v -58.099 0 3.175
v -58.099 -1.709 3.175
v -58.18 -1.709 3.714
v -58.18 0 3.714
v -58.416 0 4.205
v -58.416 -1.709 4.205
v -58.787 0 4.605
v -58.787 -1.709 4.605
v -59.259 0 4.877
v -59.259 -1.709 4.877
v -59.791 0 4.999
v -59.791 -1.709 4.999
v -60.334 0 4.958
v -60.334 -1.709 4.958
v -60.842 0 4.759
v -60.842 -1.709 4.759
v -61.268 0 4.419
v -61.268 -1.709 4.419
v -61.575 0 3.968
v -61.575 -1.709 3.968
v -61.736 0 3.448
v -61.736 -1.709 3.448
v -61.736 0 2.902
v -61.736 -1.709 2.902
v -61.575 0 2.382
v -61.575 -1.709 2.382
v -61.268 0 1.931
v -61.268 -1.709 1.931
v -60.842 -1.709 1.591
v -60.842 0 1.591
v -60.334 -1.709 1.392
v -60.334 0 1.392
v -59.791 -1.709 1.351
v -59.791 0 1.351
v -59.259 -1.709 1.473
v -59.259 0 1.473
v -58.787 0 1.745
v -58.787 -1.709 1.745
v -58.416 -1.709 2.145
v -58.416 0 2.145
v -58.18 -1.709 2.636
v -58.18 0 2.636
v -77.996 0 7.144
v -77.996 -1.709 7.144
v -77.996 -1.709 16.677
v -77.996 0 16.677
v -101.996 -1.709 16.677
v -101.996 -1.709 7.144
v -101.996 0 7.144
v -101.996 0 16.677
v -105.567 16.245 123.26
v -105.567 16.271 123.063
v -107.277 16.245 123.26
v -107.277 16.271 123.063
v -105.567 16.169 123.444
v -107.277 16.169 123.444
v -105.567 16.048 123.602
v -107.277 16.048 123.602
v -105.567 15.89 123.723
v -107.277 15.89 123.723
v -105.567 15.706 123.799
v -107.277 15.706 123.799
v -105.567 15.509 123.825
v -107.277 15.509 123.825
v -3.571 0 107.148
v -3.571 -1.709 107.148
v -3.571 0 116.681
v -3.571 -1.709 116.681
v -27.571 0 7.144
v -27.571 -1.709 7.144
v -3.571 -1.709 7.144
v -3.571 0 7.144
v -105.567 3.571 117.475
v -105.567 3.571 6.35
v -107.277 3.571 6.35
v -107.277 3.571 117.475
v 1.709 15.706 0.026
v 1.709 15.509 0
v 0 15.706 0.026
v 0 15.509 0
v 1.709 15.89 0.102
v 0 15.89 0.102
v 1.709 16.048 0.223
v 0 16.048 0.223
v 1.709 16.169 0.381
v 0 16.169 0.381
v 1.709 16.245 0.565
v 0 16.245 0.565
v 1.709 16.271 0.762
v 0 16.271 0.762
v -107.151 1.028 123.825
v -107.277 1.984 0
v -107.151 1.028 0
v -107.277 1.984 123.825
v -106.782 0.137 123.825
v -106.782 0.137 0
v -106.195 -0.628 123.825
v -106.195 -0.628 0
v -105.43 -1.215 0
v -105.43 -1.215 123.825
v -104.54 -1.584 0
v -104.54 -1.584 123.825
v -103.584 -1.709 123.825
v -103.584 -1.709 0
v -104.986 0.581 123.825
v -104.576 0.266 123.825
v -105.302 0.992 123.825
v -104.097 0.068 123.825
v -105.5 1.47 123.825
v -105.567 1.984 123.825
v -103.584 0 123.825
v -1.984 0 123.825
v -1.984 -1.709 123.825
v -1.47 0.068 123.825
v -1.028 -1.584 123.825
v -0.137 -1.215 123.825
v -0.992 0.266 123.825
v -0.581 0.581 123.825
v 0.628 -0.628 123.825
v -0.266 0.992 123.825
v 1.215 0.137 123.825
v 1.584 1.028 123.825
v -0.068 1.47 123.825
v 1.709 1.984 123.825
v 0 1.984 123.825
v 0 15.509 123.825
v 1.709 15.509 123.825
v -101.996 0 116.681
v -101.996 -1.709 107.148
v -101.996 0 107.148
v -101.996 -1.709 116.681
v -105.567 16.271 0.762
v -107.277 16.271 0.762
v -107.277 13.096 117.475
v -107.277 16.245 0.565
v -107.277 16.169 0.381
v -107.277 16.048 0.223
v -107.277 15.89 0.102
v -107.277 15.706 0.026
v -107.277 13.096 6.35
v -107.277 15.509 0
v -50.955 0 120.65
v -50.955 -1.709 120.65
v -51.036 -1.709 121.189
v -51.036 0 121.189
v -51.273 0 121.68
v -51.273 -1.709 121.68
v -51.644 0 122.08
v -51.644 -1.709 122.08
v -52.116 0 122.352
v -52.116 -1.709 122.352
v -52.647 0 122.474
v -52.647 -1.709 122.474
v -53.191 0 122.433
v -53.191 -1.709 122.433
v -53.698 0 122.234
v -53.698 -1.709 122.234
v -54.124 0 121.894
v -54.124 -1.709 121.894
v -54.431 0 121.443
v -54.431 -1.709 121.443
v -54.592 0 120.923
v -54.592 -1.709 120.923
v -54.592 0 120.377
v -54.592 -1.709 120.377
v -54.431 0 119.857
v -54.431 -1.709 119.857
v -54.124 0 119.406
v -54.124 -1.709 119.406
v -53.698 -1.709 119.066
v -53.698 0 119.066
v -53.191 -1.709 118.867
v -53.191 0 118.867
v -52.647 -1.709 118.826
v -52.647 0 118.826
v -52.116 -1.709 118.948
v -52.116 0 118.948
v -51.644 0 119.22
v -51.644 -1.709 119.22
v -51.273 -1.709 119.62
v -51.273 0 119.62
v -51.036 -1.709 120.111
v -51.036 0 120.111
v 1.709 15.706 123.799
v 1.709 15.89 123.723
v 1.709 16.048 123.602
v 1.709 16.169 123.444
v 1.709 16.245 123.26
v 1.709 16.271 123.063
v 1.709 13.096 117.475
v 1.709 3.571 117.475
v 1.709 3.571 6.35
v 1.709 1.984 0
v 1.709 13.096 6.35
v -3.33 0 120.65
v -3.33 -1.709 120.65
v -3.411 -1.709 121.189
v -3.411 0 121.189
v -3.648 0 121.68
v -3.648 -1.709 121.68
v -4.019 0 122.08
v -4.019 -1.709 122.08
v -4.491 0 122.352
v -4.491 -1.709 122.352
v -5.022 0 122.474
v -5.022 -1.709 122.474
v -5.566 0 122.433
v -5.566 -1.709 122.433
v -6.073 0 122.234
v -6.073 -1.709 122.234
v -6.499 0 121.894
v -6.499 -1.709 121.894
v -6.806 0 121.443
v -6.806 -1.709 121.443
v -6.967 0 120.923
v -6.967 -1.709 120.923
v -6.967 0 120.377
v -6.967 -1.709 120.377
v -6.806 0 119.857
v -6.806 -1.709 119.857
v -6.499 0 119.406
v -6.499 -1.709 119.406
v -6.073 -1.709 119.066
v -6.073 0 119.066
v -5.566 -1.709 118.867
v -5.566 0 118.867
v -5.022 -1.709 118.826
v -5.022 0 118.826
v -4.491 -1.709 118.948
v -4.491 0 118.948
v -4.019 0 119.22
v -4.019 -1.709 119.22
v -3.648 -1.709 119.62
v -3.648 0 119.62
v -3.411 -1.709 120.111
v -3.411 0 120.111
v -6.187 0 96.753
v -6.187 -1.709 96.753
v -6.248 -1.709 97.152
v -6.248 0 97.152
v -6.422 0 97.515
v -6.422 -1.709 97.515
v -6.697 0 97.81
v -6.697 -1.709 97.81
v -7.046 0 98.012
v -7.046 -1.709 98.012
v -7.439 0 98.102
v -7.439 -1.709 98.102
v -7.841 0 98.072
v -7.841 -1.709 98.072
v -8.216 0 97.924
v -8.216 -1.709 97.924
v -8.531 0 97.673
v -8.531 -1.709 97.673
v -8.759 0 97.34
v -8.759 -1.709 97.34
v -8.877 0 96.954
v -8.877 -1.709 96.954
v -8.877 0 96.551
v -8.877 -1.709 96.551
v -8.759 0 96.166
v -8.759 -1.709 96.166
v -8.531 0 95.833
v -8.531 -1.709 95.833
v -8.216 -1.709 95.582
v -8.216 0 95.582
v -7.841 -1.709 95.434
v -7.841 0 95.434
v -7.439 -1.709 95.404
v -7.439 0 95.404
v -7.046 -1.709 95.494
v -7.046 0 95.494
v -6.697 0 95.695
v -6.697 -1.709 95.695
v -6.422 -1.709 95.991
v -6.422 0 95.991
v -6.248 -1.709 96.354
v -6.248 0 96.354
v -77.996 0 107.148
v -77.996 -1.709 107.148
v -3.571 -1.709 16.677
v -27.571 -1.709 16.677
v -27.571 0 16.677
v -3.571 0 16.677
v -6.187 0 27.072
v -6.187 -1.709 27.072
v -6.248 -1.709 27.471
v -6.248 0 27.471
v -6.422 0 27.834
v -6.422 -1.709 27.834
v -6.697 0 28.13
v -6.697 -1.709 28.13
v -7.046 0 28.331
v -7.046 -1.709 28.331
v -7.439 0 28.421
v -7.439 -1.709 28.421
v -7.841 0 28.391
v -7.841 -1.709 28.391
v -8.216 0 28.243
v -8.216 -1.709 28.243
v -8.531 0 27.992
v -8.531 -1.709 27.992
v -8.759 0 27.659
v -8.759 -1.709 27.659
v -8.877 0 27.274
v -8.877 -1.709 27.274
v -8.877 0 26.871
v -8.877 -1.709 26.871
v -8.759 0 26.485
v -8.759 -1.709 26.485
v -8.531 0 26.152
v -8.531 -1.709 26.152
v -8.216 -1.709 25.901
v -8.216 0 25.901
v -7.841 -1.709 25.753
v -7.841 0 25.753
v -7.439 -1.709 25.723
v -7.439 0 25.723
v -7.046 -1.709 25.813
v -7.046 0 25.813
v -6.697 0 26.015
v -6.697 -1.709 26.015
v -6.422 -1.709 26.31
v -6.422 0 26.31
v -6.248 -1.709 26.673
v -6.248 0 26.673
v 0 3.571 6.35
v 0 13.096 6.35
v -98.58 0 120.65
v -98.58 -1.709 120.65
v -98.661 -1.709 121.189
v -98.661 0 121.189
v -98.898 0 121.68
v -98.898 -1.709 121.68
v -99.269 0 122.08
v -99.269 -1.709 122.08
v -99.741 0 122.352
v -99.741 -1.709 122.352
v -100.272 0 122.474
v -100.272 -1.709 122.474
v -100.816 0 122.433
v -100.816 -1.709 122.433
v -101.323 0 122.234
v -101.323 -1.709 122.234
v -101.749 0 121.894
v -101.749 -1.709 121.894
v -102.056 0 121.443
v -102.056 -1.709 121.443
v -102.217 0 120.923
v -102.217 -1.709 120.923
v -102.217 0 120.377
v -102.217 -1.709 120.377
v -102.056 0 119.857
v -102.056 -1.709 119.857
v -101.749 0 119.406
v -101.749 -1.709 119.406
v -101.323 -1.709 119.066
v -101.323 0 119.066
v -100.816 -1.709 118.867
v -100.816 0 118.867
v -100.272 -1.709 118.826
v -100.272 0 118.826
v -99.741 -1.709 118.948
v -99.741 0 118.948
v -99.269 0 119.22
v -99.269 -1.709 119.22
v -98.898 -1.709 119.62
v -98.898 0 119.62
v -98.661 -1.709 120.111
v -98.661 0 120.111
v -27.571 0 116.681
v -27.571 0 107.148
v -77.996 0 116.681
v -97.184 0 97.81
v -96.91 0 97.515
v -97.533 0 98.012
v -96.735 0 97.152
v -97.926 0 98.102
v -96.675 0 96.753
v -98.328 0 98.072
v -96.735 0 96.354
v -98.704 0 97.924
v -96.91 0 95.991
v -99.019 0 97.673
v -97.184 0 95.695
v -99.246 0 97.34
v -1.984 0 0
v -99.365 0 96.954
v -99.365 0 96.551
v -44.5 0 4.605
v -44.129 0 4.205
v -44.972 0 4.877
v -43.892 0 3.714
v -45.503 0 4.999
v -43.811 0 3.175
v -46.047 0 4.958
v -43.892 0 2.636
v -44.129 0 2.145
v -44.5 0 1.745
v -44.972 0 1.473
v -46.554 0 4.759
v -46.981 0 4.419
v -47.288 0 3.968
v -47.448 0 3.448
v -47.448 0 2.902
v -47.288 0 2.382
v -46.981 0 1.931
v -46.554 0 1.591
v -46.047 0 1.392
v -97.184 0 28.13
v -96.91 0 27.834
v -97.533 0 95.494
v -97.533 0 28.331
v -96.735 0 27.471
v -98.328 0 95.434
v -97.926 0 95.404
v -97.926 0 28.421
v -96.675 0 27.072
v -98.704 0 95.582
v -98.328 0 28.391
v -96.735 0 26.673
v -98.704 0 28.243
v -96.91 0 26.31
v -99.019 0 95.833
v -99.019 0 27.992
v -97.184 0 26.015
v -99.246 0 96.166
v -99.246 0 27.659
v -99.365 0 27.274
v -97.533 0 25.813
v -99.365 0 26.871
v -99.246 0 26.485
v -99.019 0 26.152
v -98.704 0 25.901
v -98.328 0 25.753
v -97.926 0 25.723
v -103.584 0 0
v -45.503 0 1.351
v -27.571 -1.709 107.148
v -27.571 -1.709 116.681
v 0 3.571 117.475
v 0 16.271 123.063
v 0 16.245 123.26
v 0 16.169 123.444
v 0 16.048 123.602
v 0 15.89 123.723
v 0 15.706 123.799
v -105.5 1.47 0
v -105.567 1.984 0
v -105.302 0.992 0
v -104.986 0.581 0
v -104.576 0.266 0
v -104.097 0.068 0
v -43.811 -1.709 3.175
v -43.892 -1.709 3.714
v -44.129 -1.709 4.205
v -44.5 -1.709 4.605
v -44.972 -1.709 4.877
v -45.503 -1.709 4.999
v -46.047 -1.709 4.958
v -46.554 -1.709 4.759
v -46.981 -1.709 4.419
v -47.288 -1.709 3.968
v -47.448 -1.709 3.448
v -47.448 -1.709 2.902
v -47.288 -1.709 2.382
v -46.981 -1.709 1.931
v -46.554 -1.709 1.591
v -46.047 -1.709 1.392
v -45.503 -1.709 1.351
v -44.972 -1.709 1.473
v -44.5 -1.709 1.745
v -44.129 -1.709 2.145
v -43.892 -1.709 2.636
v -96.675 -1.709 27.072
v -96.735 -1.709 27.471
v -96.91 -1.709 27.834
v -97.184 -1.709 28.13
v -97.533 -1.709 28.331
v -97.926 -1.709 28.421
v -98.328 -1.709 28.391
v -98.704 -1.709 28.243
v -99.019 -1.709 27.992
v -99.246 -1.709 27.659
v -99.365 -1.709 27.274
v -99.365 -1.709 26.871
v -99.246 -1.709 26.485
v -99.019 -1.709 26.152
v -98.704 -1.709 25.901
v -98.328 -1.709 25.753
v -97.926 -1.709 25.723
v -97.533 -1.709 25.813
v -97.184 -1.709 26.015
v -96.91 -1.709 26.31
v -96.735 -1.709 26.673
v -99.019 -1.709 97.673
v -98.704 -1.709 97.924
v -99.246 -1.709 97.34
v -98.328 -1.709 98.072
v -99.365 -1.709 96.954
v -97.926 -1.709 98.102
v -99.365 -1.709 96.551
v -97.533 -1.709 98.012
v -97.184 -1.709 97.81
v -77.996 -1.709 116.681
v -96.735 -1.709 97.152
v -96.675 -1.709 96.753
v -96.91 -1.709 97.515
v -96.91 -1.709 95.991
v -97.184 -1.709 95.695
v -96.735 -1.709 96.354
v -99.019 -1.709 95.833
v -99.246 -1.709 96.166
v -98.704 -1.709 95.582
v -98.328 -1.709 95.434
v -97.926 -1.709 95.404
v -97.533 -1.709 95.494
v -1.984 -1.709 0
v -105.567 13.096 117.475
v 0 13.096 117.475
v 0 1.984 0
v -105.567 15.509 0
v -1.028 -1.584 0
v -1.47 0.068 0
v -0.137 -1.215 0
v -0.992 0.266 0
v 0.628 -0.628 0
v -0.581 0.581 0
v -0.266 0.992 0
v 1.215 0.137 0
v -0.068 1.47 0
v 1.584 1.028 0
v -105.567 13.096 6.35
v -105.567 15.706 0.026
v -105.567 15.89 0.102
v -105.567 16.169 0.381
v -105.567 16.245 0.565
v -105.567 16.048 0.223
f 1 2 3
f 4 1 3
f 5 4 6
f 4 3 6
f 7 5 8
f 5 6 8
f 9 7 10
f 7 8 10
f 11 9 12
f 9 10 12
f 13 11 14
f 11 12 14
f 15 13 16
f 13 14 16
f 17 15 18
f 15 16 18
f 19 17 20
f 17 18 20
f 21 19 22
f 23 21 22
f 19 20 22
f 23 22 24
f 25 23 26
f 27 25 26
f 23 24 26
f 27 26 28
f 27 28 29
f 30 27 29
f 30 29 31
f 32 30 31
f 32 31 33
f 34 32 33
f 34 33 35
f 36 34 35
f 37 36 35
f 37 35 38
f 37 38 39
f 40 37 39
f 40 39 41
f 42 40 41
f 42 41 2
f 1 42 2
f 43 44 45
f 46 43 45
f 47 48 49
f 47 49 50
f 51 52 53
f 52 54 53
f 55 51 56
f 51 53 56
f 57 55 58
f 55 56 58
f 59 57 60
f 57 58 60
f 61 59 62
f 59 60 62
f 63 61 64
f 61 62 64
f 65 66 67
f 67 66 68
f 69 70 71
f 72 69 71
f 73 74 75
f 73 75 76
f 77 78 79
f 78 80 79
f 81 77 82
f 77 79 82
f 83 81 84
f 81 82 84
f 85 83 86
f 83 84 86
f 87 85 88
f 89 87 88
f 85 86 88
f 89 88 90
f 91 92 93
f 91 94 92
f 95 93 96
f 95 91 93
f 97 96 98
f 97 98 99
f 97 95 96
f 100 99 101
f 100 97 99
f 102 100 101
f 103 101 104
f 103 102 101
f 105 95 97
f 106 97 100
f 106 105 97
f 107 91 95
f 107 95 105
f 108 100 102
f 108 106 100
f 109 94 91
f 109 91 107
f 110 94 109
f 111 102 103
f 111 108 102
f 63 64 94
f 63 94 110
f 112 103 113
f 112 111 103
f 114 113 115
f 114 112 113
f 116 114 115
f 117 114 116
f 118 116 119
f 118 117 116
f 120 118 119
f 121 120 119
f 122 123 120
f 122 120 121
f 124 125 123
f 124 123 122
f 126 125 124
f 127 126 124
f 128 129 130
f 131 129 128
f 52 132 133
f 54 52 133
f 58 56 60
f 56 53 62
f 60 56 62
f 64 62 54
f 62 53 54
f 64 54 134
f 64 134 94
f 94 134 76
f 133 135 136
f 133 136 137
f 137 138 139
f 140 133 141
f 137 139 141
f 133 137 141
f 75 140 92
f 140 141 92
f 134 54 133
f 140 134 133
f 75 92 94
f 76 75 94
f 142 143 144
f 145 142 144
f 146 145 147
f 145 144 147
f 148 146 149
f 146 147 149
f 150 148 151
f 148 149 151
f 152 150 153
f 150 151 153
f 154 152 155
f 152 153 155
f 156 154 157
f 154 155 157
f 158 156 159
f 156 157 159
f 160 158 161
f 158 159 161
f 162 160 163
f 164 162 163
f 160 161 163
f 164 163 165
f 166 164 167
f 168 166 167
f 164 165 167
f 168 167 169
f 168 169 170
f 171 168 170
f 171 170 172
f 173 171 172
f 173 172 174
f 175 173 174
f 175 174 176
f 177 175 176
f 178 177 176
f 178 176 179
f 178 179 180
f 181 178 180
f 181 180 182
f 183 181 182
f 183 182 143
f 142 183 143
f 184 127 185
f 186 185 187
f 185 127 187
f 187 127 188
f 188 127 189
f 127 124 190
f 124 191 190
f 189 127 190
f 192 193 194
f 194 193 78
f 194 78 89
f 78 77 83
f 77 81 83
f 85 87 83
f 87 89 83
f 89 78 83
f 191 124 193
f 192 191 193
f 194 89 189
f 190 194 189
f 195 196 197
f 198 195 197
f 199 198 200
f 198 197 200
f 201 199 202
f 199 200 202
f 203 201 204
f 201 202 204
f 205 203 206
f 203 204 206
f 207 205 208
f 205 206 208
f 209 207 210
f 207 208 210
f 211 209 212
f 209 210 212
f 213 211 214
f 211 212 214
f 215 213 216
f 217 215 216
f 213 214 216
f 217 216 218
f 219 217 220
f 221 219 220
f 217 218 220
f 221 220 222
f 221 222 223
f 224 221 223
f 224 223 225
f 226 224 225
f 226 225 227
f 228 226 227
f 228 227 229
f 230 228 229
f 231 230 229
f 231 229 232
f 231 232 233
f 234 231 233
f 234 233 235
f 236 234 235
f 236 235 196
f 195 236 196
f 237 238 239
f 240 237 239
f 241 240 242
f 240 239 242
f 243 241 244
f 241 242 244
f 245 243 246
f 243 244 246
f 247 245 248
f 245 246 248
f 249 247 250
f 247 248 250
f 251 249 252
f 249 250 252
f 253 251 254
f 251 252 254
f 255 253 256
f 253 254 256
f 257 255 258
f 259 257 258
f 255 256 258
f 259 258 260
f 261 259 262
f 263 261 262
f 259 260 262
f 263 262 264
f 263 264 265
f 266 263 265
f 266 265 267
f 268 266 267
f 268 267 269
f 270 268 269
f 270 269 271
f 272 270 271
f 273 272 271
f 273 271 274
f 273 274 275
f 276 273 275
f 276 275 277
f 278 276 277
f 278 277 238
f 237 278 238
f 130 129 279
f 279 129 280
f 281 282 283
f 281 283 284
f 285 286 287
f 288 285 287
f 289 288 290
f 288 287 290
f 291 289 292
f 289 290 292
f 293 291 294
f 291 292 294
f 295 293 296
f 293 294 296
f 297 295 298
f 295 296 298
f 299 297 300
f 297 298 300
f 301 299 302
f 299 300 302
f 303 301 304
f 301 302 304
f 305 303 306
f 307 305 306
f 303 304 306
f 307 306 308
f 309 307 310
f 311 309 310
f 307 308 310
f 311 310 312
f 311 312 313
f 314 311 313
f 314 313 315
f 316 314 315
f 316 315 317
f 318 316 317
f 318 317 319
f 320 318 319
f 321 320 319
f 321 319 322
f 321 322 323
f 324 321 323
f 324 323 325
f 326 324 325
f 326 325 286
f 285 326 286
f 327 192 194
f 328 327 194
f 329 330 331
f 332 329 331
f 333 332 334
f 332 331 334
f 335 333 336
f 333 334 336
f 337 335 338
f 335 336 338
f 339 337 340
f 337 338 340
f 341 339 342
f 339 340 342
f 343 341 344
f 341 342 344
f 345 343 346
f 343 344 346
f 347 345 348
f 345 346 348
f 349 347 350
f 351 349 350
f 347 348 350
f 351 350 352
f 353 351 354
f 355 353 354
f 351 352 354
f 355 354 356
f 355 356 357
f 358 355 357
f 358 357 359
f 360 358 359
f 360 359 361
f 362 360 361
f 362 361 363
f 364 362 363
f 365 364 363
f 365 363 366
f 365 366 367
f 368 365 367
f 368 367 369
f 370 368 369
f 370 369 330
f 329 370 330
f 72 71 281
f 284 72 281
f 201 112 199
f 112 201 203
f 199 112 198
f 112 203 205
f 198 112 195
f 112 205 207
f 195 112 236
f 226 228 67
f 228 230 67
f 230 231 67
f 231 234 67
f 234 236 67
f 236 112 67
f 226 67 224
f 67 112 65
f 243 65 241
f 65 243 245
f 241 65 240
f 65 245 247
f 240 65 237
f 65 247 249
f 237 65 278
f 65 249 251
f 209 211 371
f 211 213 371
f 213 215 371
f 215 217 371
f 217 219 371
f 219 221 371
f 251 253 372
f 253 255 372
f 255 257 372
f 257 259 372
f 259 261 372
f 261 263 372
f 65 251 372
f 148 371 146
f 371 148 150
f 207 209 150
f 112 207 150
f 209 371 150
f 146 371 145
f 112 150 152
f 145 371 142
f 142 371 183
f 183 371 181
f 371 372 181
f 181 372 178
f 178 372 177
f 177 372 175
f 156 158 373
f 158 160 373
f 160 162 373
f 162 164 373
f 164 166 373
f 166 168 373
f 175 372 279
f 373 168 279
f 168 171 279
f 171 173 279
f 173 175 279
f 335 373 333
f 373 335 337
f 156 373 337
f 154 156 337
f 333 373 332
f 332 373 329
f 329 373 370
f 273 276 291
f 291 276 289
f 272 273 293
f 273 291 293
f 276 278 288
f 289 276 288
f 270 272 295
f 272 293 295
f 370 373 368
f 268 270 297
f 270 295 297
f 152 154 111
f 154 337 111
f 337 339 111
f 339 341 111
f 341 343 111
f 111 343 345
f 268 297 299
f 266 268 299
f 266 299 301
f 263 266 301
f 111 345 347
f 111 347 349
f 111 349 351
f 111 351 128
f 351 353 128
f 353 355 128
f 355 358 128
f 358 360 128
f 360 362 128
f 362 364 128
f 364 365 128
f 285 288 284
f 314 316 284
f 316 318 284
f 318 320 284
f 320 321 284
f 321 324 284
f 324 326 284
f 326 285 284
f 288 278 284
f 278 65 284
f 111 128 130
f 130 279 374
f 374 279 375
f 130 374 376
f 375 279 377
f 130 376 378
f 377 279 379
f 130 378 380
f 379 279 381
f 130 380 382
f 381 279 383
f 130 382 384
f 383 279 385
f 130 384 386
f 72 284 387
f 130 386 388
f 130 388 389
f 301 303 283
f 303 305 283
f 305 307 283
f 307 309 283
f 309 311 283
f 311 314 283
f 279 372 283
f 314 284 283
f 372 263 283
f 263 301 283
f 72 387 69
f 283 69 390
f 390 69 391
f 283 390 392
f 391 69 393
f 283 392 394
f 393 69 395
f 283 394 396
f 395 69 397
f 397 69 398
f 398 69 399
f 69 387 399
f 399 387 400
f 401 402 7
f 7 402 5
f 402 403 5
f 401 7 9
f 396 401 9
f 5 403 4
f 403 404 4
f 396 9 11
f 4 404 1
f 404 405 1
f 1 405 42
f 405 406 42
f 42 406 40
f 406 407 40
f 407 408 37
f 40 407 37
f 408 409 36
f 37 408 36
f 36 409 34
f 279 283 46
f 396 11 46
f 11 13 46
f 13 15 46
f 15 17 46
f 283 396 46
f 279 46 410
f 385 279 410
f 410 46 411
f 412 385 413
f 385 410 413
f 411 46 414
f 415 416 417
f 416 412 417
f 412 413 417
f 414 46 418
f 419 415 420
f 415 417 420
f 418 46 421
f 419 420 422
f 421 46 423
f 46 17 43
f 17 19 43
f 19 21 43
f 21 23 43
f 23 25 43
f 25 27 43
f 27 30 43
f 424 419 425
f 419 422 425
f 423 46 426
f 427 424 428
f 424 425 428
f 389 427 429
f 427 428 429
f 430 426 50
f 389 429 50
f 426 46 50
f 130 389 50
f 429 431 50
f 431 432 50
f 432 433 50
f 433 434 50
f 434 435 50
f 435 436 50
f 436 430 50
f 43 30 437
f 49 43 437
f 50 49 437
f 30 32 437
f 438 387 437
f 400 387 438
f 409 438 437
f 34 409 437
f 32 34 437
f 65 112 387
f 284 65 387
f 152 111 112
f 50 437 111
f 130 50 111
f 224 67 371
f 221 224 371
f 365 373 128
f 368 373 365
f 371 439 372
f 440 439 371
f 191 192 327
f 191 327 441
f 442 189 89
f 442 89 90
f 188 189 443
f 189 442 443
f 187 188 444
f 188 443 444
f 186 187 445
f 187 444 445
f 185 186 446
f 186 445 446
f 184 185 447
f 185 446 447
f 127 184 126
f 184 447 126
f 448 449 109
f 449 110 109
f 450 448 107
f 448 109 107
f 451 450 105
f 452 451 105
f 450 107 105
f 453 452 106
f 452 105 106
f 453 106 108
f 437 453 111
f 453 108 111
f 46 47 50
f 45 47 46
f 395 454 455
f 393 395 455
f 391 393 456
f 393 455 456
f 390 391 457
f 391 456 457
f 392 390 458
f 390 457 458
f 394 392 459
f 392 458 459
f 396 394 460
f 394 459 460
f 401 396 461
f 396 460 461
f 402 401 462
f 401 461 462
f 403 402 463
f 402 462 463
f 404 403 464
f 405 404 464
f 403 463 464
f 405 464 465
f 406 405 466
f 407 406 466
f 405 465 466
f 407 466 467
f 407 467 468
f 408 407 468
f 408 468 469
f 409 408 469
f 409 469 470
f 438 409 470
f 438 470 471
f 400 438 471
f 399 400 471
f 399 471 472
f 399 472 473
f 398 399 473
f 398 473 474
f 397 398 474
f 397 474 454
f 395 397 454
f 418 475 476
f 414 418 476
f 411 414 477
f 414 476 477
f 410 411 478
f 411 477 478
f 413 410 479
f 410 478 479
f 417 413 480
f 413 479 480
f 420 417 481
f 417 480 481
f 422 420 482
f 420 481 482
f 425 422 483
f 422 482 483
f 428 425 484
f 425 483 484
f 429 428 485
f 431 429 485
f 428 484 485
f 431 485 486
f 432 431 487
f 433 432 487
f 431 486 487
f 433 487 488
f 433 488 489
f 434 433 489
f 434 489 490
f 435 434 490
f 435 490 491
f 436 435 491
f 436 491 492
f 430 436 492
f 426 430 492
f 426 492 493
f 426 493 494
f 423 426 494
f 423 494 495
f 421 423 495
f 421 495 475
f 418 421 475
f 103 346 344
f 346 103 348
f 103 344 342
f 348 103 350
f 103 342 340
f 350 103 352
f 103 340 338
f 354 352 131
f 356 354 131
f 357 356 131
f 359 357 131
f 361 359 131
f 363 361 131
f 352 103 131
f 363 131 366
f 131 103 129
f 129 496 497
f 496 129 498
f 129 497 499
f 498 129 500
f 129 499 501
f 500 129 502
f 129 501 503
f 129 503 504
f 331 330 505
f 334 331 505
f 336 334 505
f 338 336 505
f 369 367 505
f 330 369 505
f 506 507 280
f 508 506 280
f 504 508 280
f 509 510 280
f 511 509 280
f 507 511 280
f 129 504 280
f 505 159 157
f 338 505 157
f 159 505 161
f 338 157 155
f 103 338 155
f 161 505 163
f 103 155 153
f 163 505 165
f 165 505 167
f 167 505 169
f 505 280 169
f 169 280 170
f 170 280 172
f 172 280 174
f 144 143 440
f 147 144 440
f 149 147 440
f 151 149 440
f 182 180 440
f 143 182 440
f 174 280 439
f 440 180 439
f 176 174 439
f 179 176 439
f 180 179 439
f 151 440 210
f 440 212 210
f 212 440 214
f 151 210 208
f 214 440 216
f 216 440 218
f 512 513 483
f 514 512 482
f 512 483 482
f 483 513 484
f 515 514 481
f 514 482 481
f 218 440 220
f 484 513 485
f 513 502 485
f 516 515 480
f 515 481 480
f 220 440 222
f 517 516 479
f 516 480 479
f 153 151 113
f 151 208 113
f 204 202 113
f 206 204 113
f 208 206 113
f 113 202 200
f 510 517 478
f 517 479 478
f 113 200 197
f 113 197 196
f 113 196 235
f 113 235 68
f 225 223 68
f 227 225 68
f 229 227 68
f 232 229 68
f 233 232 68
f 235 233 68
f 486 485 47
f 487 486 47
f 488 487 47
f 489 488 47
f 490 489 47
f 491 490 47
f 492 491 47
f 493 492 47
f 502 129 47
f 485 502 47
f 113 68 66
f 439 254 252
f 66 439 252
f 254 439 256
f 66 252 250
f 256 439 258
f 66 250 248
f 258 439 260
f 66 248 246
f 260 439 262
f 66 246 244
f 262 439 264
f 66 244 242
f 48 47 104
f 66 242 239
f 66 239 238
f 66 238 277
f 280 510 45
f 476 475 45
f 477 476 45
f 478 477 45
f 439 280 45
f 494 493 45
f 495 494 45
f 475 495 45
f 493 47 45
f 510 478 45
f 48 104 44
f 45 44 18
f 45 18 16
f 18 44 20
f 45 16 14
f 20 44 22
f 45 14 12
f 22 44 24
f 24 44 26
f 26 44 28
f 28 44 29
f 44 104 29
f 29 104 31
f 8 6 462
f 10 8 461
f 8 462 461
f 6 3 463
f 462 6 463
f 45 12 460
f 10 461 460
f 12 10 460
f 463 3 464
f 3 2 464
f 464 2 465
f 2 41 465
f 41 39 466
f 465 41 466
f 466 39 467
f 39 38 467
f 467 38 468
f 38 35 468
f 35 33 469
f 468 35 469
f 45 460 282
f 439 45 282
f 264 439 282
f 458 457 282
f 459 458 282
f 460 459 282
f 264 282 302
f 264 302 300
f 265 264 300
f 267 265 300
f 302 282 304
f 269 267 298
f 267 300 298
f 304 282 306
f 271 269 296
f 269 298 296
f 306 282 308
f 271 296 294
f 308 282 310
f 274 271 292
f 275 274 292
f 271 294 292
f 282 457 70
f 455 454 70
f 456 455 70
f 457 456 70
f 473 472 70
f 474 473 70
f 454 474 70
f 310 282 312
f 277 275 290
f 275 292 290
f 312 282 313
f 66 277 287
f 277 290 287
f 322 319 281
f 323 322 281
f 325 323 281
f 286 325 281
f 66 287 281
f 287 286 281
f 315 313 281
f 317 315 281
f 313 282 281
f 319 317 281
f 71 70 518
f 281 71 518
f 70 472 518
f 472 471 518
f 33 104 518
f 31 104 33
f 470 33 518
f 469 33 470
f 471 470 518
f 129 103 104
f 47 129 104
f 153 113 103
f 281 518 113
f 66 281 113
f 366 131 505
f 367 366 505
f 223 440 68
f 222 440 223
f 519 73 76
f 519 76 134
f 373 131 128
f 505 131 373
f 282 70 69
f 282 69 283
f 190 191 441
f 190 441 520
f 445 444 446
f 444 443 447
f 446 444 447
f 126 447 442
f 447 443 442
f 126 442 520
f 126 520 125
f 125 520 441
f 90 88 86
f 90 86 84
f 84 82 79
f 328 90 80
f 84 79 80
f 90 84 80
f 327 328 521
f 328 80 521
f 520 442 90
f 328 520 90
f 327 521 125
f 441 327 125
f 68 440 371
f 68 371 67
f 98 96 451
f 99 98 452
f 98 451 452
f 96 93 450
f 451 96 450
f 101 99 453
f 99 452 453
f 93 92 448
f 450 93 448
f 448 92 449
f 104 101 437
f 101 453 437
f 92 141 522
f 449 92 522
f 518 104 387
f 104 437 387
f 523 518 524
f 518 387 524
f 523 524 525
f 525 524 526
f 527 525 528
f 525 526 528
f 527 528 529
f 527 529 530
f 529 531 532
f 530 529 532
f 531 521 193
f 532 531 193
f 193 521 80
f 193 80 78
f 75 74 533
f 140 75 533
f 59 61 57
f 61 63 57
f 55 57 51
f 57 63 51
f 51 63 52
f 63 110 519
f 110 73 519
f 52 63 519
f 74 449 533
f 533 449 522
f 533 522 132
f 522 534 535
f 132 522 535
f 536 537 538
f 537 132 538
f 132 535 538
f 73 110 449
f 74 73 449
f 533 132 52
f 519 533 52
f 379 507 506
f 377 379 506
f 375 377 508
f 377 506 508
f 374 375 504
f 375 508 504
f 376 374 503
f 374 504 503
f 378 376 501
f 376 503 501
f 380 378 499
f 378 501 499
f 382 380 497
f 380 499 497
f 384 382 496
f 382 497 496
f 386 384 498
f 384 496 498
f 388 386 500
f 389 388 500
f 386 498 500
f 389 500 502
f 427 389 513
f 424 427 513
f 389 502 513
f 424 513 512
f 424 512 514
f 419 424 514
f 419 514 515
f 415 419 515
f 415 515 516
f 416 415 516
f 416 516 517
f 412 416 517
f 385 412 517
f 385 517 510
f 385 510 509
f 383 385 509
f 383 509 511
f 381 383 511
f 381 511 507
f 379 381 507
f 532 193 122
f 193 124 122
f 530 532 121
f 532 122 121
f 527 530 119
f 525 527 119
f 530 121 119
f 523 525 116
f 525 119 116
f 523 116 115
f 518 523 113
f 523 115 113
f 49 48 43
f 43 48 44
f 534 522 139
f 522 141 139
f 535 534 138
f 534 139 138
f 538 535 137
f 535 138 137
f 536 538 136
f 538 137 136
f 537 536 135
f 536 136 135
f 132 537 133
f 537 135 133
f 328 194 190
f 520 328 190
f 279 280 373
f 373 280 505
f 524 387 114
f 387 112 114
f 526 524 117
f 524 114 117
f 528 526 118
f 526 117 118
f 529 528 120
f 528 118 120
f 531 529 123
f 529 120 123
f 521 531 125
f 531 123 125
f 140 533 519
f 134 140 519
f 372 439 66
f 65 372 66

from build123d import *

# Parameters (mm, degrees)
F1_DEPTH = 123.825
F2_W     = 9.525
F2_H     = 111.125
F3_DEPTH = 108.98632
F4_R     = 3.69316
F5_R     = 1.98374
F6_R     = 1.8288
F6_W     = 24
F6_H     = 9.5329248
F6_R_2   = 1.35255
F7_DEPTH = 248
F8_R     = 0.762


# Not quite as in the source:
# - an extrude ends at something that could not be found from the text; its depth is read off the source's solid


with BuildPart() as f1:
    # F0 (on Top) → F1 (new body)
    with BuildSketch(Plane.XY):
        Polygon((0, 16.27124), (0, 0), (-105.56748, 0), (-105.56748, 16.27124), (-107.2769, 16.27124), (-107.2769, -1.70942), (1.70942, -1.70942), (1.70942, 16.27124), align=None)
    extrude(amount=F1_DEPTH)

    # F2 (on face) → F3 (cut, through all)
    with BuildSketch(Plane.YZ.offset(1.70942)):
        with Locations((8.33374, 61.9125)):
            Rectangle(F2_W, F2_H)
    extrude(amount=-F3_DEPTH, mode=Mode.SUBTRACT)

    # F4
    f4_edges = [f1.edges().sort_by_distance(p)[0] for p in [
        (1.70942, -1.70942, 61.9125),
        (-107.2769, -1.70942, 61.9125),
    ]]
    fillet(f4_edges, radius=F4_R)

    # F5
    f5_edges = [f1.edges().sort_by_distance(p)[0] for p in [
        (0, 0, 61.9125),
        (-105.56748, 0, 61.9125),
    ]]
    fillet(f5_edges, radius=F5_R)

    # F6 (on face) → F7 (cut, through all)
    with BuildSketch(Plane.XZ.offset(1.70942)):
        with Locations((-52.78374, 120.65)):
            Circle(F6_R)
        with Locations((-5.15874, 120.65)):
            Circle(F6_R)
        with Locations((-100.40874, 120.65)):
            Circle(F6_R)
        with Locations((-45.63999, 3.175)):
            Circle(F6_R)
        with Locations((-59.92749, 3.175)):
            Circle(F6_R)
        with Locations((-89.99624, 111.9147876)):
            Rectangle(F6_W, F6_H)
        with Locations((-89.99624, 11.9102124)):
            Rectangle(F6_W, F6_H)
        with Locations((-15.57124, 111.9147876)):
            Rectangle(F6_W, F6_H)
        with Locations((-15.57124, 11.9102124)):
            Rectangle(F6_W, F6_H)
        with Locations((-98.02749, 96.7528672)):
            Circle(F6_R_2)
        with Locations((-98.02749, 27.0721328)):
            Circle(F6_R_2)
        with Locations((-7.53999, 27.0721328)):
            Circle(F6_R_2)
        with Locations((-7.53999, 96.7528672)):
            Circle(F6_R_2)
    extrude(amount=-F7_DEPTH, mode=Mode.SUBTRACT)

    # F8
    f8_edges = [f1.edges().sort_by_distance(p)[0] for p in [
        (-106.42219, 16.27124, 123.825),
        (0.85471, 16.27124, 123.825),
        (0.85471, 16.27124, 0),
        (-106.42219, 16.27124, 0),
    ]]
    fillet(f8_edges, radius=F8_R)


solid = f1.part
